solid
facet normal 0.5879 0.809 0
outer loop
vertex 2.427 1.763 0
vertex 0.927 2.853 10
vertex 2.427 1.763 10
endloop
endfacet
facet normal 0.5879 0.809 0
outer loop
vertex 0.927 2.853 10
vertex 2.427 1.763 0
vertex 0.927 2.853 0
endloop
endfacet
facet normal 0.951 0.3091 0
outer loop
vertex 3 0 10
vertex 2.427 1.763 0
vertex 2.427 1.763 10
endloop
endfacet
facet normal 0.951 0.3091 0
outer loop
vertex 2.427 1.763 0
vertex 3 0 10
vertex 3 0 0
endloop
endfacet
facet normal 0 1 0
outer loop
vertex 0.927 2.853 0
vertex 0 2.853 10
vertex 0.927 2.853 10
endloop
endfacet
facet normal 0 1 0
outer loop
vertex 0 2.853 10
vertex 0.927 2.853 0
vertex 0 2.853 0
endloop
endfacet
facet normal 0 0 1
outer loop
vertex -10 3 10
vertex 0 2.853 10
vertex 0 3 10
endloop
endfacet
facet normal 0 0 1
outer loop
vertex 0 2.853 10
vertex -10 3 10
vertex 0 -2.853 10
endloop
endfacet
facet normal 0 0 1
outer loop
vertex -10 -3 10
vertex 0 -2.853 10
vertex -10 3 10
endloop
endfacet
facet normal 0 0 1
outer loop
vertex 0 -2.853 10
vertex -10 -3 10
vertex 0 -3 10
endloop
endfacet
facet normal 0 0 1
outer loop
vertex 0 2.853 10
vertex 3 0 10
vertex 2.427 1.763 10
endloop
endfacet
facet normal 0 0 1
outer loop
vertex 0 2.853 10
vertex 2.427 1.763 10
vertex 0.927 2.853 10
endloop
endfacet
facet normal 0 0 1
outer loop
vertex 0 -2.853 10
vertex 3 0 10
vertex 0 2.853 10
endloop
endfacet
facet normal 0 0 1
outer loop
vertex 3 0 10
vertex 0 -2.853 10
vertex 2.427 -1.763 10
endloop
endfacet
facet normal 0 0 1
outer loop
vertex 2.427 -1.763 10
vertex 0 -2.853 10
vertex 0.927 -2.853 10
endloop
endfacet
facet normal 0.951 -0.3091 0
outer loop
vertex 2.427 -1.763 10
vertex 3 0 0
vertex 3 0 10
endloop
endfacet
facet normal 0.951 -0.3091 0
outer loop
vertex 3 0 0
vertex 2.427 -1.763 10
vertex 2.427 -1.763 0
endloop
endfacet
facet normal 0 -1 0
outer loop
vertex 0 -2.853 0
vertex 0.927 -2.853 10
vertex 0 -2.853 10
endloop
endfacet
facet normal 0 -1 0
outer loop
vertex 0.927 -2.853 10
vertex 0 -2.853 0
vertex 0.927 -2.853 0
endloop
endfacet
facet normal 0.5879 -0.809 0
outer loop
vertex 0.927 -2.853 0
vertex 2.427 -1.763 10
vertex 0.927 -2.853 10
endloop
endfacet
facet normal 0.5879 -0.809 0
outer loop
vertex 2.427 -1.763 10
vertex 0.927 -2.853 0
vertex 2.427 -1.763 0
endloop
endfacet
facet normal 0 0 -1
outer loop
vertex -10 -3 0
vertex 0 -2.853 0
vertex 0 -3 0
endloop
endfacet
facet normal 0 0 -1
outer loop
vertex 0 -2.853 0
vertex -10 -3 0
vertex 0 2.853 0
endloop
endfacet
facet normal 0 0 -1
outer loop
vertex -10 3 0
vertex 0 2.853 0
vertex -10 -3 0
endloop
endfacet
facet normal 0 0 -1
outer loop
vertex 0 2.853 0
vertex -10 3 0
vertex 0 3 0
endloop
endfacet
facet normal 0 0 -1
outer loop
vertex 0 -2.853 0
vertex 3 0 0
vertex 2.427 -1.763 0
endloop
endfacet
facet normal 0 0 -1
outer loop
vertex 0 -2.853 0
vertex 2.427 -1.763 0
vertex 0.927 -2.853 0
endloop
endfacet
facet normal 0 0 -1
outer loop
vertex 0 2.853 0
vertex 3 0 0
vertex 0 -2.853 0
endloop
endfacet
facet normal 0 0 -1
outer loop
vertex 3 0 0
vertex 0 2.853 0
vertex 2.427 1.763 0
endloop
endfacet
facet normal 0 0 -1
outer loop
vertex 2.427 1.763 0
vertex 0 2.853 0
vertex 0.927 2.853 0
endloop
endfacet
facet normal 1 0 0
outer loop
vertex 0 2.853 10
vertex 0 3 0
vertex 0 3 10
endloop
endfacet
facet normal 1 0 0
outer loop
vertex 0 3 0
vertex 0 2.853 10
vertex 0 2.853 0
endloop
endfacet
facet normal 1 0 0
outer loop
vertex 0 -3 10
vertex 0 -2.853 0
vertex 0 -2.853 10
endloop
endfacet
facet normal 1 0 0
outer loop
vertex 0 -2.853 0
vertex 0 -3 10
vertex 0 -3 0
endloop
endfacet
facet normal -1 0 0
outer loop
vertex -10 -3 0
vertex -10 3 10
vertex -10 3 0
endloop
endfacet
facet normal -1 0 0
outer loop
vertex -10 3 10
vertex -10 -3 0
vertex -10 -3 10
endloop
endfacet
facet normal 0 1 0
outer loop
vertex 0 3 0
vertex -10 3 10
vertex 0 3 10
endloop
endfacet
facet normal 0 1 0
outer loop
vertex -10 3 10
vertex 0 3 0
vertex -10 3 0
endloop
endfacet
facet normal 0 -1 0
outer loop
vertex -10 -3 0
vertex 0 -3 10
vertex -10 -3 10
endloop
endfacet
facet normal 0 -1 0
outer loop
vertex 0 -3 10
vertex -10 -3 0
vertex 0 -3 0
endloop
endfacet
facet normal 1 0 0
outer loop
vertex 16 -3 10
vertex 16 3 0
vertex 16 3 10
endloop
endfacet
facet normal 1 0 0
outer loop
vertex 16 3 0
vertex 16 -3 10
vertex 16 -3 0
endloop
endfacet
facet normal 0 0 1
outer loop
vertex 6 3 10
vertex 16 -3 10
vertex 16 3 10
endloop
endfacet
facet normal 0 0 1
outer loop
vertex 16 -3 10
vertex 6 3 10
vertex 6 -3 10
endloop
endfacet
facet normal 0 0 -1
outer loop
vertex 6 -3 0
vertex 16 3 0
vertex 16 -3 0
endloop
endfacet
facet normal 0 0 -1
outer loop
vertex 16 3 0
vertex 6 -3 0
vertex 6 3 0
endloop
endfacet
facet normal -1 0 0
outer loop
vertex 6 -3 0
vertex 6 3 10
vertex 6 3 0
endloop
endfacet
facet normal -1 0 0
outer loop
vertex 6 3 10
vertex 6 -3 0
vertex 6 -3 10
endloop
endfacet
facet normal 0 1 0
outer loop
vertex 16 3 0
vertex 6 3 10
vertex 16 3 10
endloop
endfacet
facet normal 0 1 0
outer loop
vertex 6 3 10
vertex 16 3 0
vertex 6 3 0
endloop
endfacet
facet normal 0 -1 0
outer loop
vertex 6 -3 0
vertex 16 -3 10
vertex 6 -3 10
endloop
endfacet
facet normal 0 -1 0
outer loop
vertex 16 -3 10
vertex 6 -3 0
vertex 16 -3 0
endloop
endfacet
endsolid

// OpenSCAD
module bisagra() {
    difference() {
        union() {
            cylinder(h=10, d=6); // Eje central
            translate([-10, -3, 0]) cube([10, 6, 10]); // Parte fija
            translate([6, -3, 0]) cube([10, 6, 10]); // Parte móvil
        }
        translate([3, -4, -1]) cylinder(h=12, d=3); // Agujero para pasador
    }
}

// Muestra la bisagra
bisagra();
